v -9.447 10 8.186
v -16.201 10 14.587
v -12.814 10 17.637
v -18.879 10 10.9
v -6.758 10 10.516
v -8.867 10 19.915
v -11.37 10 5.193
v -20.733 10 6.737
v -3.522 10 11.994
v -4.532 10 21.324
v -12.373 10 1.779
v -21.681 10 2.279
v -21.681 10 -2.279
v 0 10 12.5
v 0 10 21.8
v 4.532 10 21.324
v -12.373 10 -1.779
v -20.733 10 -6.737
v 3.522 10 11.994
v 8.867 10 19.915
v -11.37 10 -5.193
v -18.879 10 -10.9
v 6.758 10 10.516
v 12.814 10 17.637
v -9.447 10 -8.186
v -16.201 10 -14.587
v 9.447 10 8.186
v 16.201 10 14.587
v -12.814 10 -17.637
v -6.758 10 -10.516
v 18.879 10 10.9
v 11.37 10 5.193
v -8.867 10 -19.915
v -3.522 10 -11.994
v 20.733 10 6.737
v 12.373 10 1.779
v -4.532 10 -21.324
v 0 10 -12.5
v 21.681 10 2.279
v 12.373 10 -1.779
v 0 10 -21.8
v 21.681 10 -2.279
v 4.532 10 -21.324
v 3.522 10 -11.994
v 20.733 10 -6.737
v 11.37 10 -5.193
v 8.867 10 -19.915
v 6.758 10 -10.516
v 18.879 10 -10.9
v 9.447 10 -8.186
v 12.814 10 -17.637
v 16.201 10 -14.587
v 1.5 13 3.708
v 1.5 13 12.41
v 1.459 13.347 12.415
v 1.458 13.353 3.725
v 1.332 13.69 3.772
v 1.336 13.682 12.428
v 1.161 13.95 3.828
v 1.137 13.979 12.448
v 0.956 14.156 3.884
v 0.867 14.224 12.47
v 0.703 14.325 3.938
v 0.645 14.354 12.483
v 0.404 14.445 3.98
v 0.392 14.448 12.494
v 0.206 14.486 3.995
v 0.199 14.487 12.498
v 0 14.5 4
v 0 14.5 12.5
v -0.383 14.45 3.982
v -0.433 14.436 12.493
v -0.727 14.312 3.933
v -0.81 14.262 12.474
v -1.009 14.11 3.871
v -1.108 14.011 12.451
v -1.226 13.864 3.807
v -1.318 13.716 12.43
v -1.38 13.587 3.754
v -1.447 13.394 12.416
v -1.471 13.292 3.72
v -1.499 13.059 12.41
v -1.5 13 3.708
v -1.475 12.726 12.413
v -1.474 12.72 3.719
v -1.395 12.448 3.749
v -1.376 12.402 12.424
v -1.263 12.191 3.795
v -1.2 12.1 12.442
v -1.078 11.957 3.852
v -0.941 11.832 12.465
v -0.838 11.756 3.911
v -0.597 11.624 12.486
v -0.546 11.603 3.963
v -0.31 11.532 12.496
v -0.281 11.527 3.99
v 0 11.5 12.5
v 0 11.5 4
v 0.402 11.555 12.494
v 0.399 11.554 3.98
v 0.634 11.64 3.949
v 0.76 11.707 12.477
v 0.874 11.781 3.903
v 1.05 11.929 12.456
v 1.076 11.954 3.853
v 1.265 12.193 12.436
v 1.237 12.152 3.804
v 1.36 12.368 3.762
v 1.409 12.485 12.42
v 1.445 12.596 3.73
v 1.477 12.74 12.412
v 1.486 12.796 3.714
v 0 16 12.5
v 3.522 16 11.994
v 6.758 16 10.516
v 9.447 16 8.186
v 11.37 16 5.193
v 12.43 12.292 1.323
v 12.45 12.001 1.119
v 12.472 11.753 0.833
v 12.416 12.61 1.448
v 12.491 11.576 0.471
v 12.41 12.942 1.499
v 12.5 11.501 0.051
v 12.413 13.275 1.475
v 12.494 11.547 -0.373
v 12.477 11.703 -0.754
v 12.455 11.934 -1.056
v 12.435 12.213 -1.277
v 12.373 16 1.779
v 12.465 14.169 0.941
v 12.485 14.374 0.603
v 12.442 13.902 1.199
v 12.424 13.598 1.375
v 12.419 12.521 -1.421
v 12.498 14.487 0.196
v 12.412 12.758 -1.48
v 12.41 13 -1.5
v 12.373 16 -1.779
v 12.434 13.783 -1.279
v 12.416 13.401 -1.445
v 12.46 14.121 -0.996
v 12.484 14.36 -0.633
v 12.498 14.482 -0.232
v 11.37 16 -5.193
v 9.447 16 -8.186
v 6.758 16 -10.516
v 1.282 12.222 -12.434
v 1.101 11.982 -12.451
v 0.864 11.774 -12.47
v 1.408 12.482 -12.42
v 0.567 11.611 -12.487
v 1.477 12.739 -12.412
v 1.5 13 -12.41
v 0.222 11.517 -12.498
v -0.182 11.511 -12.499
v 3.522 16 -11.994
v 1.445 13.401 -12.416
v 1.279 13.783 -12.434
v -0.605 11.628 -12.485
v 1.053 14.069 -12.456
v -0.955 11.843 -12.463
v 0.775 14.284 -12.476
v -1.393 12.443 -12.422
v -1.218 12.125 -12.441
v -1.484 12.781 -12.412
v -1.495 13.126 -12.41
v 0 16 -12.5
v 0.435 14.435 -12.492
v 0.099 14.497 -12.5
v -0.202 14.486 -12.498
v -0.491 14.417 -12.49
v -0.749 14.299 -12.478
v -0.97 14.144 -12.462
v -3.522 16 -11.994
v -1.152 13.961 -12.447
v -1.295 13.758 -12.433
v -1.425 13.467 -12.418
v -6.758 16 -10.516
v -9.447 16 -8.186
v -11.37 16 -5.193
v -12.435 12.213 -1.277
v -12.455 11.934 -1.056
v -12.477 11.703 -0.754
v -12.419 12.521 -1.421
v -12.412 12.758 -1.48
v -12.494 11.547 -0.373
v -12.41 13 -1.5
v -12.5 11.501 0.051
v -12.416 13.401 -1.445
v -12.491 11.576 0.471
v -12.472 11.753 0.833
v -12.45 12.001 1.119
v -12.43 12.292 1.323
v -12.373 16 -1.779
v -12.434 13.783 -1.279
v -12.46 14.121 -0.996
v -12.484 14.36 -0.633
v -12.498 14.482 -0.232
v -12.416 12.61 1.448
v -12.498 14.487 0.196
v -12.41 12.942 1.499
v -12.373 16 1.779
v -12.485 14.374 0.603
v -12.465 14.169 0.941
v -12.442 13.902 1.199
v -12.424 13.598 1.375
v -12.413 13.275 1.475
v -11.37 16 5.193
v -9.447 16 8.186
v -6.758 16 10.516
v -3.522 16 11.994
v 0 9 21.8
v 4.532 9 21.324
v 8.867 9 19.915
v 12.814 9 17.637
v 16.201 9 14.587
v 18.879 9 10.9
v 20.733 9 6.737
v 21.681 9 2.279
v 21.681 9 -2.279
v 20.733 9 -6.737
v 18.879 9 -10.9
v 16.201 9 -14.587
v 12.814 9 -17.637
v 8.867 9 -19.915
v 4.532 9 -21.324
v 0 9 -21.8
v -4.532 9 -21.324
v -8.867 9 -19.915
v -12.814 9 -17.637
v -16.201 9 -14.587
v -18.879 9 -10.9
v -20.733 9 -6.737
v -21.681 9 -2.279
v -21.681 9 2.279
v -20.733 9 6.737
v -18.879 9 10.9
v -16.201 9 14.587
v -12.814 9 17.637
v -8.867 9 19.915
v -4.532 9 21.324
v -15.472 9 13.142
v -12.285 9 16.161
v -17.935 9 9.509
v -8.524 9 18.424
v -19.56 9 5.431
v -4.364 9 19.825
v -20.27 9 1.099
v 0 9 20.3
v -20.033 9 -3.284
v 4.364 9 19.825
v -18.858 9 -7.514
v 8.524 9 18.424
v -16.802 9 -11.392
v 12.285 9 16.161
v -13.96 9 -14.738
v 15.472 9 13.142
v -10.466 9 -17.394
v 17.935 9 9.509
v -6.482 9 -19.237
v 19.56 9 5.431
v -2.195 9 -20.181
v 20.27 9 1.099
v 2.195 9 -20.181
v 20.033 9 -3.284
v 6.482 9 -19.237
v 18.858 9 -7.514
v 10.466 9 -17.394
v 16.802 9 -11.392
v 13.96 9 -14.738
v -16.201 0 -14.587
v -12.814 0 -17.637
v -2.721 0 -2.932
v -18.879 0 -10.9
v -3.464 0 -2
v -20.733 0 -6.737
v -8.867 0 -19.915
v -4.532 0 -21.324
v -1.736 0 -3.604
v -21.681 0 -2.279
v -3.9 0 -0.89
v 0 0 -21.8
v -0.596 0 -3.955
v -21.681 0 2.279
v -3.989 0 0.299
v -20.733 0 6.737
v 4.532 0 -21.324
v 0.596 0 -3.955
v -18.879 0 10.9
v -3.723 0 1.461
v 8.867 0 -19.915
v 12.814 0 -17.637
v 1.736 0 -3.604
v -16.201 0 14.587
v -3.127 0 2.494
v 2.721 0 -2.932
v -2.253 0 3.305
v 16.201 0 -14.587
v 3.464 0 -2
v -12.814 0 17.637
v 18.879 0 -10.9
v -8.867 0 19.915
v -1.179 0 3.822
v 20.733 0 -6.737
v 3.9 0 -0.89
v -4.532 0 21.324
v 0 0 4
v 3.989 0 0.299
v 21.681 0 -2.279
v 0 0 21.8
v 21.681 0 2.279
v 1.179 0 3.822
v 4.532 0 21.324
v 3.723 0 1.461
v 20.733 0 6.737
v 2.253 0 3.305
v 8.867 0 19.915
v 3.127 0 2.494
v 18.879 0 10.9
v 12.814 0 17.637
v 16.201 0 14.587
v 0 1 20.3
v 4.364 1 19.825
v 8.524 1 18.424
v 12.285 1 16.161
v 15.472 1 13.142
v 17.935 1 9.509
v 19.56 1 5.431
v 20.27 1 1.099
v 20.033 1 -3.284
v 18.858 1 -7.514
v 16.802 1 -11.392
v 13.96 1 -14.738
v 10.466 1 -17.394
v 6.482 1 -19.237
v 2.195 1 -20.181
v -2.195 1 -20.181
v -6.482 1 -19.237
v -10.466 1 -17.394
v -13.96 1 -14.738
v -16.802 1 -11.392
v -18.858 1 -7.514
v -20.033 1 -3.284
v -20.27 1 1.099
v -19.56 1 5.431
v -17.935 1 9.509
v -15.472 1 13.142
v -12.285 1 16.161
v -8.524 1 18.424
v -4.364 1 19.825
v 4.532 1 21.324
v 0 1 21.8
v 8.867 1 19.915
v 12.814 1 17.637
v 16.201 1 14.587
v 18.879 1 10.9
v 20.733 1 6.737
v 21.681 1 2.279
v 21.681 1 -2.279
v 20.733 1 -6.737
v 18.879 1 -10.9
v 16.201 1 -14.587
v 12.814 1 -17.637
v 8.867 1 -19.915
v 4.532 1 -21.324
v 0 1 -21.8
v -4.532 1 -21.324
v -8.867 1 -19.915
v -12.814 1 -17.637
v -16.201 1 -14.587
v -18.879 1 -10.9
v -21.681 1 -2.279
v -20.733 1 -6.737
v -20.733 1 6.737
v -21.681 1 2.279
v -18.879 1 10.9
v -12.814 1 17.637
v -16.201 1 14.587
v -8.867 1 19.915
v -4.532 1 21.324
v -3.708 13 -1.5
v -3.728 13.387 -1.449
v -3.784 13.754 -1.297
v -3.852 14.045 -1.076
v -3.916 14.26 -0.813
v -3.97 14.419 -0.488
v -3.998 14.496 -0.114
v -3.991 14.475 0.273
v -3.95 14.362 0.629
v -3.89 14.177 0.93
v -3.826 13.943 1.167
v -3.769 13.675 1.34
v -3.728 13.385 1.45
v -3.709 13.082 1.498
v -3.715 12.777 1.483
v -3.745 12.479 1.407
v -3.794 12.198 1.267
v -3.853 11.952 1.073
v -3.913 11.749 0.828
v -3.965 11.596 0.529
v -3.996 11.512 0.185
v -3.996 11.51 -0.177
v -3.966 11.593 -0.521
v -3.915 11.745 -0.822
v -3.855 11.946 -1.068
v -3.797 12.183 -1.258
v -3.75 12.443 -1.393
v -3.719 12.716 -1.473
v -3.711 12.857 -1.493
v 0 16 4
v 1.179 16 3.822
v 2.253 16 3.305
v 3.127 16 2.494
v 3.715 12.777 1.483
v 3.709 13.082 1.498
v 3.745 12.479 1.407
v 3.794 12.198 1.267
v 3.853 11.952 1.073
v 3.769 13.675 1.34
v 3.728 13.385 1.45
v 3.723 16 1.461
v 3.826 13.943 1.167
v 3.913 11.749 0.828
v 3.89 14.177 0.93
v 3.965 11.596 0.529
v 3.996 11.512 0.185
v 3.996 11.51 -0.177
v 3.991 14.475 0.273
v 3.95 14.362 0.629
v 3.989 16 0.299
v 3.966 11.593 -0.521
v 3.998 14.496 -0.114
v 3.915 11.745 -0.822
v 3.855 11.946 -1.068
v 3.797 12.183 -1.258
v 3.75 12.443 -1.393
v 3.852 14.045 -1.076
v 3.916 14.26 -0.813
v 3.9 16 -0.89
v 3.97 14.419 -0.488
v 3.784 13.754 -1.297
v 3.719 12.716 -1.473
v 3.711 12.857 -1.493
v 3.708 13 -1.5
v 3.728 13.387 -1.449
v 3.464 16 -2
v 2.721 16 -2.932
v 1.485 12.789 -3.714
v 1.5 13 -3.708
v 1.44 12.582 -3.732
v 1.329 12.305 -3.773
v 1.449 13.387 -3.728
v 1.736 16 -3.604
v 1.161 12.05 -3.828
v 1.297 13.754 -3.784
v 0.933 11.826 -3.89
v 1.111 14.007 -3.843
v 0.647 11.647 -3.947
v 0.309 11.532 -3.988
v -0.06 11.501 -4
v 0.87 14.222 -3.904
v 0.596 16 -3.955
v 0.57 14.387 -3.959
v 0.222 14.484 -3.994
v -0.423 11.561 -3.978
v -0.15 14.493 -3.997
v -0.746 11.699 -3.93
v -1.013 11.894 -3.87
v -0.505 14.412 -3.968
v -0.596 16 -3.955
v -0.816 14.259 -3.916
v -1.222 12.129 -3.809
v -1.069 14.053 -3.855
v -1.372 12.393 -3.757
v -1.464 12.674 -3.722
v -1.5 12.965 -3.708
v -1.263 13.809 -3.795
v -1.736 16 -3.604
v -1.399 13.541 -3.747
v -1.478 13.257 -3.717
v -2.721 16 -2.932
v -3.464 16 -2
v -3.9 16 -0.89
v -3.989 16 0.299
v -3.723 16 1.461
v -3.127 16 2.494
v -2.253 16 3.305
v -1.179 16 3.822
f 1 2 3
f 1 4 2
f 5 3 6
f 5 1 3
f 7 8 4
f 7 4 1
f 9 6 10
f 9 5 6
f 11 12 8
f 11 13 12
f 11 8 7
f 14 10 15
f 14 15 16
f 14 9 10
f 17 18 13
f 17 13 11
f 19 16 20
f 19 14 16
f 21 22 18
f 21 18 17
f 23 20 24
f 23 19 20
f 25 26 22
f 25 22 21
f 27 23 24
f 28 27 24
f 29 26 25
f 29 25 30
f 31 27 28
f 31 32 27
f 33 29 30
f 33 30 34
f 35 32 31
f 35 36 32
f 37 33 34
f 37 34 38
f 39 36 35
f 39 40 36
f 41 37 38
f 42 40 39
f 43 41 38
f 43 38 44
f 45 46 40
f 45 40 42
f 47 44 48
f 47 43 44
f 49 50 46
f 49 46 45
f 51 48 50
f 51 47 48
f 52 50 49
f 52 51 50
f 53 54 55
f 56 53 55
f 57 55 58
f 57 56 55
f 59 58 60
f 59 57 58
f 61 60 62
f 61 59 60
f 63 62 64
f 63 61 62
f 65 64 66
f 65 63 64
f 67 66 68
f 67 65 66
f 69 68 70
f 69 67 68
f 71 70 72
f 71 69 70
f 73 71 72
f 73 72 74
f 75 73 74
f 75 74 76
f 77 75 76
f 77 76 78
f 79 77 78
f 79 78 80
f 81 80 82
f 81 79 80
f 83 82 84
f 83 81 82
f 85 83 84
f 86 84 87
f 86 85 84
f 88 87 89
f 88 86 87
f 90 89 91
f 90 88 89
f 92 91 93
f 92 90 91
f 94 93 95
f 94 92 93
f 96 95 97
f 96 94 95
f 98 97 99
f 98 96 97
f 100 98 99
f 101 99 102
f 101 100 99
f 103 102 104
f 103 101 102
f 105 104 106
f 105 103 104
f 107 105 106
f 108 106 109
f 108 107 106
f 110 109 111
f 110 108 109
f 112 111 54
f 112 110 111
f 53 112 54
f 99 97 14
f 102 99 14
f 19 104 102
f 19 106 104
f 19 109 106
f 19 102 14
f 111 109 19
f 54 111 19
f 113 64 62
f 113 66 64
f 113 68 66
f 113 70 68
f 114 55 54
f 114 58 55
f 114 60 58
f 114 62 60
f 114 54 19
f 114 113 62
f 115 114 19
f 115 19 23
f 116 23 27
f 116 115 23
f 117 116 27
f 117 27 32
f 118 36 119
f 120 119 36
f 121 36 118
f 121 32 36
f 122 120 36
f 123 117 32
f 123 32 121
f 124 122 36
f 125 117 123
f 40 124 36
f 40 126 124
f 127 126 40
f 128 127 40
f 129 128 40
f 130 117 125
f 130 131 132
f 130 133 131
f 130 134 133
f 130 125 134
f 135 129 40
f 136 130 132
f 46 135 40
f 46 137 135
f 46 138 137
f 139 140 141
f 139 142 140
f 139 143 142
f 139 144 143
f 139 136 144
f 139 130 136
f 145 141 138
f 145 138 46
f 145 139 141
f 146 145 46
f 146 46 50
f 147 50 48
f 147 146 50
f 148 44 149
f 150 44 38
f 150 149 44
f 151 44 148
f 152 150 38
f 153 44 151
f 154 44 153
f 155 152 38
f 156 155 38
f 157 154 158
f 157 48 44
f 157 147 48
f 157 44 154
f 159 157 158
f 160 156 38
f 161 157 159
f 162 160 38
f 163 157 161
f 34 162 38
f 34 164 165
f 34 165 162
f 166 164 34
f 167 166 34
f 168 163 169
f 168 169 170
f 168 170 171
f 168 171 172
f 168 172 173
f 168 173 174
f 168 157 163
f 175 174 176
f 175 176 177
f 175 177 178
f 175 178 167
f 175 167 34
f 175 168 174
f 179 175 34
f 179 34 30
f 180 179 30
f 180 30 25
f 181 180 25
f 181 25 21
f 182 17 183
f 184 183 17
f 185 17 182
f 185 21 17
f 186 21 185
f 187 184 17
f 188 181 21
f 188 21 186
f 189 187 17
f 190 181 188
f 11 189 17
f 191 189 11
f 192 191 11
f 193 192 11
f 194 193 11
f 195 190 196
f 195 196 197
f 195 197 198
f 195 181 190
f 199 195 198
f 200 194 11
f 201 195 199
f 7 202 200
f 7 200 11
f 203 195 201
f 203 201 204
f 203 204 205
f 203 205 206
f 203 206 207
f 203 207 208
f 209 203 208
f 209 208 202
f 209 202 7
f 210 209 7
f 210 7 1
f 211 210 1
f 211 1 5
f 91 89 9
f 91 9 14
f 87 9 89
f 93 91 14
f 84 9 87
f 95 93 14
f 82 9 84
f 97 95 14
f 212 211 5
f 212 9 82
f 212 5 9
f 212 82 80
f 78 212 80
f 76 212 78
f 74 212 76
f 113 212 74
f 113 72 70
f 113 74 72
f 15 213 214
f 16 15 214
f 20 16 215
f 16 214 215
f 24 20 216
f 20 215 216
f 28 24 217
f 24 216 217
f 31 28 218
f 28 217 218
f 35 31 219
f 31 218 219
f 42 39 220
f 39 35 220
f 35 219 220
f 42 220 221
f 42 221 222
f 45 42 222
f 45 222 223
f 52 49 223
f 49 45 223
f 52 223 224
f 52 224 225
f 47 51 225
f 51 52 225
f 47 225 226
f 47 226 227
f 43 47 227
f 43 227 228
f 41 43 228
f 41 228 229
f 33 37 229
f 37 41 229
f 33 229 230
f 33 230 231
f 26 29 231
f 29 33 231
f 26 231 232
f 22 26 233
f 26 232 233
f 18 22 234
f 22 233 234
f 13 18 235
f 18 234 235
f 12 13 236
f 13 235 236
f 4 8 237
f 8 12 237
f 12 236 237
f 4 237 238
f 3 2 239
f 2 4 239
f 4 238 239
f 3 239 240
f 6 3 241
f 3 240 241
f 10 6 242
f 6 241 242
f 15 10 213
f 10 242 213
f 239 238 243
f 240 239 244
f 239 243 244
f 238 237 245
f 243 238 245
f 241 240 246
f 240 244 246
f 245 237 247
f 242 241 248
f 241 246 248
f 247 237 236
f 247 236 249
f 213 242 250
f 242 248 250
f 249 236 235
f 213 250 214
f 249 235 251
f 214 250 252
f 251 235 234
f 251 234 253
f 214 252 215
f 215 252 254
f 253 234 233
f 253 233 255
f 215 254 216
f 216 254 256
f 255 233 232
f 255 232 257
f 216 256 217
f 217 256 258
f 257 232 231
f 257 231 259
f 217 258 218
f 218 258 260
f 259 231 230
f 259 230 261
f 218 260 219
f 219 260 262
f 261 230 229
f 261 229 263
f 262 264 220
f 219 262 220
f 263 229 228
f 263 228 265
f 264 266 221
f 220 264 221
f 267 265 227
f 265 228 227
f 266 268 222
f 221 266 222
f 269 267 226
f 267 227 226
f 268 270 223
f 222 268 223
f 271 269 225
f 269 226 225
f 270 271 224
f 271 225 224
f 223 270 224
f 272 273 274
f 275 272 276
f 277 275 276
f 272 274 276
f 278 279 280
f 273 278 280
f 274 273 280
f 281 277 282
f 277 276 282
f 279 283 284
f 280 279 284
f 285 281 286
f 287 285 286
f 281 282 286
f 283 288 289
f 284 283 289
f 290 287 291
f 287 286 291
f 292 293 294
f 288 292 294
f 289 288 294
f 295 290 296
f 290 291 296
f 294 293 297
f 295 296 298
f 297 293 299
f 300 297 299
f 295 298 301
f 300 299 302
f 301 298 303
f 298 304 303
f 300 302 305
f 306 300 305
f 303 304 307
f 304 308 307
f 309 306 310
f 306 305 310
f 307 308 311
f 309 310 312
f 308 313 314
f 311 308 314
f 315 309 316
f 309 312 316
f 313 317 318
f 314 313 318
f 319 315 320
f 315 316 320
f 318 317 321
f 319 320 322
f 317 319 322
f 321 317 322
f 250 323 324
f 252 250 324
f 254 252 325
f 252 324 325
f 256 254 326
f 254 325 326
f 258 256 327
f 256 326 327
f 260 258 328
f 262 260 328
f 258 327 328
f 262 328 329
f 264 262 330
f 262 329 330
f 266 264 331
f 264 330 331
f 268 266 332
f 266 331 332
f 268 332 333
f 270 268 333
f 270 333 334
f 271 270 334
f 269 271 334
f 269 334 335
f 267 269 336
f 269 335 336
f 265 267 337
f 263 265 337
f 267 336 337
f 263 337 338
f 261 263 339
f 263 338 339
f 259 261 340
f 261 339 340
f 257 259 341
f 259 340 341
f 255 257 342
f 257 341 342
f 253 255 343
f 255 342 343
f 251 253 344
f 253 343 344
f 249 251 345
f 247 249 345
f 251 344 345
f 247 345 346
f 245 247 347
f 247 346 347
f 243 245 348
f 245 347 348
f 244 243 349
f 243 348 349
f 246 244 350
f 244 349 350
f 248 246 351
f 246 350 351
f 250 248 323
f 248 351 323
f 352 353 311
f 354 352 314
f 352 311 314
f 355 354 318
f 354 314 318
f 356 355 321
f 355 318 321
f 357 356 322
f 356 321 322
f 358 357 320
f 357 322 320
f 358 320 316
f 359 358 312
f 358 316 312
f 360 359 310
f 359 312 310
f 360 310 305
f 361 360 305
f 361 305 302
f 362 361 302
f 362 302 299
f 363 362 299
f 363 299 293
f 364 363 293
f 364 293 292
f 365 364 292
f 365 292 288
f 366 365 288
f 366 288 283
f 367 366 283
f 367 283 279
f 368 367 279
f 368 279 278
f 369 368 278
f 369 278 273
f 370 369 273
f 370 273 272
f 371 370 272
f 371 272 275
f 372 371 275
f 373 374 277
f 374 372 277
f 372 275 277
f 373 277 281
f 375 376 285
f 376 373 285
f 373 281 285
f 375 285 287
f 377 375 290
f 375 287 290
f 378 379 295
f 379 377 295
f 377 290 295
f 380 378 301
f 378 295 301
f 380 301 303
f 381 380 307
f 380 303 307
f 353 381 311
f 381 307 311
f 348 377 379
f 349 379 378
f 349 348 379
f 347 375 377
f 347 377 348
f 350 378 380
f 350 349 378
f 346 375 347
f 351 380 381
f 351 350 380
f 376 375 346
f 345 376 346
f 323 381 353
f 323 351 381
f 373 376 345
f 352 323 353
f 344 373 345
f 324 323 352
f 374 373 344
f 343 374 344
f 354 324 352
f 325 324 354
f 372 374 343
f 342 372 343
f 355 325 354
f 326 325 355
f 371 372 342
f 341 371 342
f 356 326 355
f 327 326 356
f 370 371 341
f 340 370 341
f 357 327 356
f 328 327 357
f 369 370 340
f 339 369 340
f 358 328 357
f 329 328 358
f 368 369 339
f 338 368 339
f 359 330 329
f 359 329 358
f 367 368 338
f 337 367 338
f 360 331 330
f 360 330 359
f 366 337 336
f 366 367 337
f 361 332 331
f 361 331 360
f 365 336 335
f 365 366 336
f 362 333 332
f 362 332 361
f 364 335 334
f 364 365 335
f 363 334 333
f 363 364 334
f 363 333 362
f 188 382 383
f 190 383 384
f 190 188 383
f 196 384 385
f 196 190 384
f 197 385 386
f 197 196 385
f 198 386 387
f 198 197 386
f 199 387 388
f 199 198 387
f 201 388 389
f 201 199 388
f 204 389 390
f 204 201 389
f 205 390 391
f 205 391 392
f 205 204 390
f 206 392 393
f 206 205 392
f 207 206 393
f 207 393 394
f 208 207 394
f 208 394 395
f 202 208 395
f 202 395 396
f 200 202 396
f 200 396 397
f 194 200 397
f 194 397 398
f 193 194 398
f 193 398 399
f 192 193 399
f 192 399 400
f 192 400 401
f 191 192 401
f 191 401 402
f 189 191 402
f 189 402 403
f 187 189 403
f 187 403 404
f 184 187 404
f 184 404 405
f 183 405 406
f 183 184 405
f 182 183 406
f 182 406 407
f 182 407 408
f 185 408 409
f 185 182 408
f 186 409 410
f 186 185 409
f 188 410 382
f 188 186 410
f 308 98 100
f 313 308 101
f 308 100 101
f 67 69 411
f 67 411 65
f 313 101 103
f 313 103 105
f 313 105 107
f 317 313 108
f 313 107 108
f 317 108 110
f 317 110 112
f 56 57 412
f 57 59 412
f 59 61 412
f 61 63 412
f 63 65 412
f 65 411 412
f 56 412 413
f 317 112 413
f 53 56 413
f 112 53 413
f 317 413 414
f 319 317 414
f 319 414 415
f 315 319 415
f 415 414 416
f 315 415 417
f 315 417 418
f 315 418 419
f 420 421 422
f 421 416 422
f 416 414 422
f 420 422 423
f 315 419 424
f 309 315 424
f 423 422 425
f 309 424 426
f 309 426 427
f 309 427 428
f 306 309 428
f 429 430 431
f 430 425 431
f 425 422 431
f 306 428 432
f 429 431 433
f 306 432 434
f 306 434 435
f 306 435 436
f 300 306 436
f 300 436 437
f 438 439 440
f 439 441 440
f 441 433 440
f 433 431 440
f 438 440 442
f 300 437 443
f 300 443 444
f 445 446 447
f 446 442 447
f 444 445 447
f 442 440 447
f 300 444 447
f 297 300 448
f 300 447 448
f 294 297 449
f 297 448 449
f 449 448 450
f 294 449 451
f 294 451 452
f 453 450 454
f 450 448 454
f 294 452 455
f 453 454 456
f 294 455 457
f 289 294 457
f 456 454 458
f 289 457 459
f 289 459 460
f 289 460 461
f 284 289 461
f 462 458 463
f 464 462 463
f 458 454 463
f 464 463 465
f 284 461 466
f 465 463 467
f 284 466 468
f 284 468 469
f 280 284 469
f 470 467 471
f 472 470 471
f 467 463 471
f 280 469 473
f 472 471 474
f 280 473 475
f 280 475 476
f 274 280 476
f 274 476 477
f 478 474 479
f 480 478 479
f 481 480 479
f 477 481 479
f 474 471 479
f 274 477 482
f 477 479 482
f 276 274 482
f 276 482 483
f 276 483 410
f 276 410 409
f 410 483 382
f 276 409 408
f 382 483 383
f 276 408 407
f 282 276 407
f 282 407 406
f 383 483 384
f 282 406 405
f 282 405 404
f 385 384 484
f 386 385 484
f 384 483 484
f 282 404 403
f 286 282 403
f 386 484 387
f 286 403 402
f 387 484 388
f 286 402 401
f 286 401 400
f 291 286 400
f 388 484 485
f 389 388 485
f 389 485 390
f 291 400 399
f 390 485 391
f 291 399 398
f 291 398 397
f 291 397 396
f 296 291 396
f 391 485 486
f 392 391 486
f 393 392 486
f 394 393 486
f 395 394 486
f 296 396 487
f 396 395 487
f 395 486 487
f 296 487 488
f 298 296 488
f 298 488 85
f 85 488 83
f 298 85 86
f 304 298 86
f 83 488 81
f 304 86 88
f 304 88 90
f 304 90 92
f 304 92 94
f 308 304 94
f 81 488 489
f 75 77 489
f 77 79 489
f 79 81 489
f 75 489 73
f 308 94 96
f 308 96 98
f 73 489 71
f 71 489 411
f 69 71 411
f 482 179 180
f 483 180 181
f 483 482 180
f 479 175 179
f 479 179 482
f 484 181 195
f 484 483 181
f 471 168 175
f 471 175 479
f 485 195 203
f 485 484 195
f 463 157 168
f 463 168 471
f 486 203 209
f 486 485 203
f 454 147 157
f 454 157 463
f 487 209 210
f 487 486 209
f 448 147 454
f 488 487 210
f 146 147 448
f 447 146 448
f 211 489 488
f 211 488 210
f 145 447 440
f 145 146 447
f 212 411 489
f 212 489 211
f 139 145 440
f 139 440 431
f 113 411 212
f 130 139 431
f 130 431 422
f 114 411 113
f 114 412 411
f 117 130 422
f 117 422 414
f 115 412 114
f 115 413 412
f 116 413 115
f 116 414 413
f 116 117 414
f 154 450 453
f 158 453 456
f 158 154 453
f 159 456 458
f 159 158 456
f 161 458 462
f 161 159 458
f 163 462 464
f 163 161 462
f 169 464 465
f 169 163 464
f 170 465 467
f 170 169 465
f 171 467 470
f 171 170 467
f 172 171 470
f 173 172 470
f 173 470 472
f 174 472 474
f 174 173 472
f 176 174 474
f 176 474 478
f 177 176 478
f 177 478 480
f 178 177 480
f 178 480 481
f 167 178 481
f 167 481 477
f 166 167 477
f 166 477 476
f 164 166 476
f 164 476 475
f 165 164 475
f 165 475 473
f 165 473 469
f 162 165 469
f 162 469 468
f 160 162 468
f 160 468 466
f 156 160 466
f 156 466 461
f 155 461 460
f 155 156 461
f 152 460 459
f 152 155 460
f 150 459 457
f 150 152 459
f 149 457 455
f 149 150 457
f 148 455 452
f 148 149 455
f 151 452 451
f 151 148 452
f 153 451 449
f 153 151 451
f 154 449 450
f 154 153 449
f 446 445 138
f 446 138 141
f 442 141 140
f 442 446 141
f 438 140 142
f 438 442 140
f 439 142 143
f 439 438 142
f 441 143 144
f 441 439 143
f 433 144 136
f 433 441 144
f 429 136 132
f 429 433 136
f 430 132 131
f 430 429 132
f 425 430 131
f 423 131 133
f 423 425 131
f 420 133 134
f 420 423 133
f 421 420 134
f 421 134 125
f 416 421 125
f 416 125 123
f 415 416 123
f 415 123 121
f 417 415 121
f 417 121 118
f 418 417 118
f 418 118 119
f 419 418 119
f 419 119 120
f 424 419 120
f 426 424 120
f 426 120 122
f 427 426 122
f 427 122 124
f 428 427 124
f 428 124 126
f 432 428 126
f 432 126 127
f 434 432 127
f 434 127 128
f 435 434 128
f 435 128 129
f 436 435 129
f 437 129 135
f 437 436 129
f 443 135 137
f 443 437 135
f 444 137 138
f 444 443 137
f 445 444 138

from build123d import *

# Parameters (mm, degrees)
SKETCH_2_R               = 21.8
EXTRUDE_1_DEPTH          = 16
SKETCH_3_R               = 4
CUT_EXTRUDE_1_DEPTH      = 35.734420968
SKETCH_4_OUTSIDE_W       = 58.34
SKETCH_4_OUTSIDE_H       = 58.34
SKETCH_4_OUTSIDE_R       = 12.5
CUT_EXTRUDE_2_DEPTH      = 6
SKETCH_5_OUTSIDE_W       = 58.34
SKETCH_5_OUTSIDE_H       = 58.34
SKETCH_5_OUTSIDE_R       = 20.3
CUT_EXTRUDE_3_DEPTH      = 8
CUT_EXTRUDE_4_DEPTH      = 35.734420968
CUT_EXTRUDE_4_DEPTH_BACK = 35.734420968
SKETCH_6_R               = 1.5
CUT_EXTRUDE_5_DEPTH      = 35.734421014
CUT_EXTRUDE_5_DEPTH_BACK = 35.734421014
SKETCH_7_R               = 1.5


with BuildPart() as part:
    # 草图2 → 凸台-拉伸1 (new body)
    with BuildSketch(Plane(origin=(0, 0, 0), x_dir=(1, 0, 0), z_dir=(0, 1, 0))):
        with Locations(Location((0, 0, 0), (0, 0, 270))):
            Circle(SKETCH_2_R)
    extrude(amount=EXTRUDE_1_DEPTH)

    # 草图3 → 切除-拉伸1 (cut, through all)
    with BuildSketch(Plane(origin=(0, 16, 0), x_dir=(1, 0, 0), z_dir=(0, 1, 0))):
        with Locations(Location((0, 0, 0), (0, 0, 270))):
            Circle(SKETCH_3_R)
    extrude(amount=-CUT_EXTRUDE_1_DEPTH, mode=Mode.SUBTRACT)

    # 草图4 outside → 切除-拉伸2 (cut)
    with BuildSketch(Plane(origin=(0, 16, 0), x_dir=(1, 0, 0), z_dir=(0, 1, 0))):
        Rectangle(SKETCH_4_OUTSIDE_W, SKETCH_4_OUTSIDE_H)
        with Locations(Location((0, 0, 0), (0, 0, 270))):
            Circle(SKETCH_4_OUTSIDE_R, mode=Mode.SUBTRACT)
    extrude(amount=-CUT_EXTRUDE_2_DEPTH, mode=Mode.SUBTRACT)

    # 草图5 outside → 切除-拉伸3 (cut)
    with BuildSketch(Plane(origin=(0, 1, 0), x_dir=(1, 0, 0), z_dir=(0, 1, 0))):
        Rectangle(SKETCH_5_OUTSIDE_W, SKETCH_5_OUTSIDE_H)
        with Locations(Location((0, 0, 0), (0, 0, 270))):
            Circle(SKETCH_5_OUTSIDE_R, mode=Mode.SUBTRACT)
    extrude(amount=CUT_EXTRUDE_3_DEPTH, mode=Mode.SUBTRACT)

    # 草图6 → 切除-拉伸4 (cut, two sides: drawn at the far end of the back side and taken through both)
    with BuildSketch(Plane(origin=(0, 0, 0), x_dir=(0, 0, -1), z_dir=(1, 0, 0)).offset(-CUT_EXTRUDE_4_DEPTH_BACK)):
        with Locations((0, 13)):
            Circle(SKETCH_6_R)
    extrude(amount=CUT_EXTRUDE_4_DEPTH + CUT_EXTRUDE_4_DEPTH_BACK, mode=Mode.SUBTRACT)

    # 草图7 → 切除-拉伸5 (cut, two sides: drawn at the far end of the back side and taken through both)
    with BuildSketch(Plane.XY.offset(-CUT_EXTRUDE_5_DEPTH_BACK)):
        with Locations((0, 13)):
            Circle(SKETCH_7_R)
    extrude(amount=CUT_EXTRUDE_5_DEPTH + CUT_EXTRUDE_5_DEPTH_BACK, mode=Mode.SUBTRACT)


solid = part.part
